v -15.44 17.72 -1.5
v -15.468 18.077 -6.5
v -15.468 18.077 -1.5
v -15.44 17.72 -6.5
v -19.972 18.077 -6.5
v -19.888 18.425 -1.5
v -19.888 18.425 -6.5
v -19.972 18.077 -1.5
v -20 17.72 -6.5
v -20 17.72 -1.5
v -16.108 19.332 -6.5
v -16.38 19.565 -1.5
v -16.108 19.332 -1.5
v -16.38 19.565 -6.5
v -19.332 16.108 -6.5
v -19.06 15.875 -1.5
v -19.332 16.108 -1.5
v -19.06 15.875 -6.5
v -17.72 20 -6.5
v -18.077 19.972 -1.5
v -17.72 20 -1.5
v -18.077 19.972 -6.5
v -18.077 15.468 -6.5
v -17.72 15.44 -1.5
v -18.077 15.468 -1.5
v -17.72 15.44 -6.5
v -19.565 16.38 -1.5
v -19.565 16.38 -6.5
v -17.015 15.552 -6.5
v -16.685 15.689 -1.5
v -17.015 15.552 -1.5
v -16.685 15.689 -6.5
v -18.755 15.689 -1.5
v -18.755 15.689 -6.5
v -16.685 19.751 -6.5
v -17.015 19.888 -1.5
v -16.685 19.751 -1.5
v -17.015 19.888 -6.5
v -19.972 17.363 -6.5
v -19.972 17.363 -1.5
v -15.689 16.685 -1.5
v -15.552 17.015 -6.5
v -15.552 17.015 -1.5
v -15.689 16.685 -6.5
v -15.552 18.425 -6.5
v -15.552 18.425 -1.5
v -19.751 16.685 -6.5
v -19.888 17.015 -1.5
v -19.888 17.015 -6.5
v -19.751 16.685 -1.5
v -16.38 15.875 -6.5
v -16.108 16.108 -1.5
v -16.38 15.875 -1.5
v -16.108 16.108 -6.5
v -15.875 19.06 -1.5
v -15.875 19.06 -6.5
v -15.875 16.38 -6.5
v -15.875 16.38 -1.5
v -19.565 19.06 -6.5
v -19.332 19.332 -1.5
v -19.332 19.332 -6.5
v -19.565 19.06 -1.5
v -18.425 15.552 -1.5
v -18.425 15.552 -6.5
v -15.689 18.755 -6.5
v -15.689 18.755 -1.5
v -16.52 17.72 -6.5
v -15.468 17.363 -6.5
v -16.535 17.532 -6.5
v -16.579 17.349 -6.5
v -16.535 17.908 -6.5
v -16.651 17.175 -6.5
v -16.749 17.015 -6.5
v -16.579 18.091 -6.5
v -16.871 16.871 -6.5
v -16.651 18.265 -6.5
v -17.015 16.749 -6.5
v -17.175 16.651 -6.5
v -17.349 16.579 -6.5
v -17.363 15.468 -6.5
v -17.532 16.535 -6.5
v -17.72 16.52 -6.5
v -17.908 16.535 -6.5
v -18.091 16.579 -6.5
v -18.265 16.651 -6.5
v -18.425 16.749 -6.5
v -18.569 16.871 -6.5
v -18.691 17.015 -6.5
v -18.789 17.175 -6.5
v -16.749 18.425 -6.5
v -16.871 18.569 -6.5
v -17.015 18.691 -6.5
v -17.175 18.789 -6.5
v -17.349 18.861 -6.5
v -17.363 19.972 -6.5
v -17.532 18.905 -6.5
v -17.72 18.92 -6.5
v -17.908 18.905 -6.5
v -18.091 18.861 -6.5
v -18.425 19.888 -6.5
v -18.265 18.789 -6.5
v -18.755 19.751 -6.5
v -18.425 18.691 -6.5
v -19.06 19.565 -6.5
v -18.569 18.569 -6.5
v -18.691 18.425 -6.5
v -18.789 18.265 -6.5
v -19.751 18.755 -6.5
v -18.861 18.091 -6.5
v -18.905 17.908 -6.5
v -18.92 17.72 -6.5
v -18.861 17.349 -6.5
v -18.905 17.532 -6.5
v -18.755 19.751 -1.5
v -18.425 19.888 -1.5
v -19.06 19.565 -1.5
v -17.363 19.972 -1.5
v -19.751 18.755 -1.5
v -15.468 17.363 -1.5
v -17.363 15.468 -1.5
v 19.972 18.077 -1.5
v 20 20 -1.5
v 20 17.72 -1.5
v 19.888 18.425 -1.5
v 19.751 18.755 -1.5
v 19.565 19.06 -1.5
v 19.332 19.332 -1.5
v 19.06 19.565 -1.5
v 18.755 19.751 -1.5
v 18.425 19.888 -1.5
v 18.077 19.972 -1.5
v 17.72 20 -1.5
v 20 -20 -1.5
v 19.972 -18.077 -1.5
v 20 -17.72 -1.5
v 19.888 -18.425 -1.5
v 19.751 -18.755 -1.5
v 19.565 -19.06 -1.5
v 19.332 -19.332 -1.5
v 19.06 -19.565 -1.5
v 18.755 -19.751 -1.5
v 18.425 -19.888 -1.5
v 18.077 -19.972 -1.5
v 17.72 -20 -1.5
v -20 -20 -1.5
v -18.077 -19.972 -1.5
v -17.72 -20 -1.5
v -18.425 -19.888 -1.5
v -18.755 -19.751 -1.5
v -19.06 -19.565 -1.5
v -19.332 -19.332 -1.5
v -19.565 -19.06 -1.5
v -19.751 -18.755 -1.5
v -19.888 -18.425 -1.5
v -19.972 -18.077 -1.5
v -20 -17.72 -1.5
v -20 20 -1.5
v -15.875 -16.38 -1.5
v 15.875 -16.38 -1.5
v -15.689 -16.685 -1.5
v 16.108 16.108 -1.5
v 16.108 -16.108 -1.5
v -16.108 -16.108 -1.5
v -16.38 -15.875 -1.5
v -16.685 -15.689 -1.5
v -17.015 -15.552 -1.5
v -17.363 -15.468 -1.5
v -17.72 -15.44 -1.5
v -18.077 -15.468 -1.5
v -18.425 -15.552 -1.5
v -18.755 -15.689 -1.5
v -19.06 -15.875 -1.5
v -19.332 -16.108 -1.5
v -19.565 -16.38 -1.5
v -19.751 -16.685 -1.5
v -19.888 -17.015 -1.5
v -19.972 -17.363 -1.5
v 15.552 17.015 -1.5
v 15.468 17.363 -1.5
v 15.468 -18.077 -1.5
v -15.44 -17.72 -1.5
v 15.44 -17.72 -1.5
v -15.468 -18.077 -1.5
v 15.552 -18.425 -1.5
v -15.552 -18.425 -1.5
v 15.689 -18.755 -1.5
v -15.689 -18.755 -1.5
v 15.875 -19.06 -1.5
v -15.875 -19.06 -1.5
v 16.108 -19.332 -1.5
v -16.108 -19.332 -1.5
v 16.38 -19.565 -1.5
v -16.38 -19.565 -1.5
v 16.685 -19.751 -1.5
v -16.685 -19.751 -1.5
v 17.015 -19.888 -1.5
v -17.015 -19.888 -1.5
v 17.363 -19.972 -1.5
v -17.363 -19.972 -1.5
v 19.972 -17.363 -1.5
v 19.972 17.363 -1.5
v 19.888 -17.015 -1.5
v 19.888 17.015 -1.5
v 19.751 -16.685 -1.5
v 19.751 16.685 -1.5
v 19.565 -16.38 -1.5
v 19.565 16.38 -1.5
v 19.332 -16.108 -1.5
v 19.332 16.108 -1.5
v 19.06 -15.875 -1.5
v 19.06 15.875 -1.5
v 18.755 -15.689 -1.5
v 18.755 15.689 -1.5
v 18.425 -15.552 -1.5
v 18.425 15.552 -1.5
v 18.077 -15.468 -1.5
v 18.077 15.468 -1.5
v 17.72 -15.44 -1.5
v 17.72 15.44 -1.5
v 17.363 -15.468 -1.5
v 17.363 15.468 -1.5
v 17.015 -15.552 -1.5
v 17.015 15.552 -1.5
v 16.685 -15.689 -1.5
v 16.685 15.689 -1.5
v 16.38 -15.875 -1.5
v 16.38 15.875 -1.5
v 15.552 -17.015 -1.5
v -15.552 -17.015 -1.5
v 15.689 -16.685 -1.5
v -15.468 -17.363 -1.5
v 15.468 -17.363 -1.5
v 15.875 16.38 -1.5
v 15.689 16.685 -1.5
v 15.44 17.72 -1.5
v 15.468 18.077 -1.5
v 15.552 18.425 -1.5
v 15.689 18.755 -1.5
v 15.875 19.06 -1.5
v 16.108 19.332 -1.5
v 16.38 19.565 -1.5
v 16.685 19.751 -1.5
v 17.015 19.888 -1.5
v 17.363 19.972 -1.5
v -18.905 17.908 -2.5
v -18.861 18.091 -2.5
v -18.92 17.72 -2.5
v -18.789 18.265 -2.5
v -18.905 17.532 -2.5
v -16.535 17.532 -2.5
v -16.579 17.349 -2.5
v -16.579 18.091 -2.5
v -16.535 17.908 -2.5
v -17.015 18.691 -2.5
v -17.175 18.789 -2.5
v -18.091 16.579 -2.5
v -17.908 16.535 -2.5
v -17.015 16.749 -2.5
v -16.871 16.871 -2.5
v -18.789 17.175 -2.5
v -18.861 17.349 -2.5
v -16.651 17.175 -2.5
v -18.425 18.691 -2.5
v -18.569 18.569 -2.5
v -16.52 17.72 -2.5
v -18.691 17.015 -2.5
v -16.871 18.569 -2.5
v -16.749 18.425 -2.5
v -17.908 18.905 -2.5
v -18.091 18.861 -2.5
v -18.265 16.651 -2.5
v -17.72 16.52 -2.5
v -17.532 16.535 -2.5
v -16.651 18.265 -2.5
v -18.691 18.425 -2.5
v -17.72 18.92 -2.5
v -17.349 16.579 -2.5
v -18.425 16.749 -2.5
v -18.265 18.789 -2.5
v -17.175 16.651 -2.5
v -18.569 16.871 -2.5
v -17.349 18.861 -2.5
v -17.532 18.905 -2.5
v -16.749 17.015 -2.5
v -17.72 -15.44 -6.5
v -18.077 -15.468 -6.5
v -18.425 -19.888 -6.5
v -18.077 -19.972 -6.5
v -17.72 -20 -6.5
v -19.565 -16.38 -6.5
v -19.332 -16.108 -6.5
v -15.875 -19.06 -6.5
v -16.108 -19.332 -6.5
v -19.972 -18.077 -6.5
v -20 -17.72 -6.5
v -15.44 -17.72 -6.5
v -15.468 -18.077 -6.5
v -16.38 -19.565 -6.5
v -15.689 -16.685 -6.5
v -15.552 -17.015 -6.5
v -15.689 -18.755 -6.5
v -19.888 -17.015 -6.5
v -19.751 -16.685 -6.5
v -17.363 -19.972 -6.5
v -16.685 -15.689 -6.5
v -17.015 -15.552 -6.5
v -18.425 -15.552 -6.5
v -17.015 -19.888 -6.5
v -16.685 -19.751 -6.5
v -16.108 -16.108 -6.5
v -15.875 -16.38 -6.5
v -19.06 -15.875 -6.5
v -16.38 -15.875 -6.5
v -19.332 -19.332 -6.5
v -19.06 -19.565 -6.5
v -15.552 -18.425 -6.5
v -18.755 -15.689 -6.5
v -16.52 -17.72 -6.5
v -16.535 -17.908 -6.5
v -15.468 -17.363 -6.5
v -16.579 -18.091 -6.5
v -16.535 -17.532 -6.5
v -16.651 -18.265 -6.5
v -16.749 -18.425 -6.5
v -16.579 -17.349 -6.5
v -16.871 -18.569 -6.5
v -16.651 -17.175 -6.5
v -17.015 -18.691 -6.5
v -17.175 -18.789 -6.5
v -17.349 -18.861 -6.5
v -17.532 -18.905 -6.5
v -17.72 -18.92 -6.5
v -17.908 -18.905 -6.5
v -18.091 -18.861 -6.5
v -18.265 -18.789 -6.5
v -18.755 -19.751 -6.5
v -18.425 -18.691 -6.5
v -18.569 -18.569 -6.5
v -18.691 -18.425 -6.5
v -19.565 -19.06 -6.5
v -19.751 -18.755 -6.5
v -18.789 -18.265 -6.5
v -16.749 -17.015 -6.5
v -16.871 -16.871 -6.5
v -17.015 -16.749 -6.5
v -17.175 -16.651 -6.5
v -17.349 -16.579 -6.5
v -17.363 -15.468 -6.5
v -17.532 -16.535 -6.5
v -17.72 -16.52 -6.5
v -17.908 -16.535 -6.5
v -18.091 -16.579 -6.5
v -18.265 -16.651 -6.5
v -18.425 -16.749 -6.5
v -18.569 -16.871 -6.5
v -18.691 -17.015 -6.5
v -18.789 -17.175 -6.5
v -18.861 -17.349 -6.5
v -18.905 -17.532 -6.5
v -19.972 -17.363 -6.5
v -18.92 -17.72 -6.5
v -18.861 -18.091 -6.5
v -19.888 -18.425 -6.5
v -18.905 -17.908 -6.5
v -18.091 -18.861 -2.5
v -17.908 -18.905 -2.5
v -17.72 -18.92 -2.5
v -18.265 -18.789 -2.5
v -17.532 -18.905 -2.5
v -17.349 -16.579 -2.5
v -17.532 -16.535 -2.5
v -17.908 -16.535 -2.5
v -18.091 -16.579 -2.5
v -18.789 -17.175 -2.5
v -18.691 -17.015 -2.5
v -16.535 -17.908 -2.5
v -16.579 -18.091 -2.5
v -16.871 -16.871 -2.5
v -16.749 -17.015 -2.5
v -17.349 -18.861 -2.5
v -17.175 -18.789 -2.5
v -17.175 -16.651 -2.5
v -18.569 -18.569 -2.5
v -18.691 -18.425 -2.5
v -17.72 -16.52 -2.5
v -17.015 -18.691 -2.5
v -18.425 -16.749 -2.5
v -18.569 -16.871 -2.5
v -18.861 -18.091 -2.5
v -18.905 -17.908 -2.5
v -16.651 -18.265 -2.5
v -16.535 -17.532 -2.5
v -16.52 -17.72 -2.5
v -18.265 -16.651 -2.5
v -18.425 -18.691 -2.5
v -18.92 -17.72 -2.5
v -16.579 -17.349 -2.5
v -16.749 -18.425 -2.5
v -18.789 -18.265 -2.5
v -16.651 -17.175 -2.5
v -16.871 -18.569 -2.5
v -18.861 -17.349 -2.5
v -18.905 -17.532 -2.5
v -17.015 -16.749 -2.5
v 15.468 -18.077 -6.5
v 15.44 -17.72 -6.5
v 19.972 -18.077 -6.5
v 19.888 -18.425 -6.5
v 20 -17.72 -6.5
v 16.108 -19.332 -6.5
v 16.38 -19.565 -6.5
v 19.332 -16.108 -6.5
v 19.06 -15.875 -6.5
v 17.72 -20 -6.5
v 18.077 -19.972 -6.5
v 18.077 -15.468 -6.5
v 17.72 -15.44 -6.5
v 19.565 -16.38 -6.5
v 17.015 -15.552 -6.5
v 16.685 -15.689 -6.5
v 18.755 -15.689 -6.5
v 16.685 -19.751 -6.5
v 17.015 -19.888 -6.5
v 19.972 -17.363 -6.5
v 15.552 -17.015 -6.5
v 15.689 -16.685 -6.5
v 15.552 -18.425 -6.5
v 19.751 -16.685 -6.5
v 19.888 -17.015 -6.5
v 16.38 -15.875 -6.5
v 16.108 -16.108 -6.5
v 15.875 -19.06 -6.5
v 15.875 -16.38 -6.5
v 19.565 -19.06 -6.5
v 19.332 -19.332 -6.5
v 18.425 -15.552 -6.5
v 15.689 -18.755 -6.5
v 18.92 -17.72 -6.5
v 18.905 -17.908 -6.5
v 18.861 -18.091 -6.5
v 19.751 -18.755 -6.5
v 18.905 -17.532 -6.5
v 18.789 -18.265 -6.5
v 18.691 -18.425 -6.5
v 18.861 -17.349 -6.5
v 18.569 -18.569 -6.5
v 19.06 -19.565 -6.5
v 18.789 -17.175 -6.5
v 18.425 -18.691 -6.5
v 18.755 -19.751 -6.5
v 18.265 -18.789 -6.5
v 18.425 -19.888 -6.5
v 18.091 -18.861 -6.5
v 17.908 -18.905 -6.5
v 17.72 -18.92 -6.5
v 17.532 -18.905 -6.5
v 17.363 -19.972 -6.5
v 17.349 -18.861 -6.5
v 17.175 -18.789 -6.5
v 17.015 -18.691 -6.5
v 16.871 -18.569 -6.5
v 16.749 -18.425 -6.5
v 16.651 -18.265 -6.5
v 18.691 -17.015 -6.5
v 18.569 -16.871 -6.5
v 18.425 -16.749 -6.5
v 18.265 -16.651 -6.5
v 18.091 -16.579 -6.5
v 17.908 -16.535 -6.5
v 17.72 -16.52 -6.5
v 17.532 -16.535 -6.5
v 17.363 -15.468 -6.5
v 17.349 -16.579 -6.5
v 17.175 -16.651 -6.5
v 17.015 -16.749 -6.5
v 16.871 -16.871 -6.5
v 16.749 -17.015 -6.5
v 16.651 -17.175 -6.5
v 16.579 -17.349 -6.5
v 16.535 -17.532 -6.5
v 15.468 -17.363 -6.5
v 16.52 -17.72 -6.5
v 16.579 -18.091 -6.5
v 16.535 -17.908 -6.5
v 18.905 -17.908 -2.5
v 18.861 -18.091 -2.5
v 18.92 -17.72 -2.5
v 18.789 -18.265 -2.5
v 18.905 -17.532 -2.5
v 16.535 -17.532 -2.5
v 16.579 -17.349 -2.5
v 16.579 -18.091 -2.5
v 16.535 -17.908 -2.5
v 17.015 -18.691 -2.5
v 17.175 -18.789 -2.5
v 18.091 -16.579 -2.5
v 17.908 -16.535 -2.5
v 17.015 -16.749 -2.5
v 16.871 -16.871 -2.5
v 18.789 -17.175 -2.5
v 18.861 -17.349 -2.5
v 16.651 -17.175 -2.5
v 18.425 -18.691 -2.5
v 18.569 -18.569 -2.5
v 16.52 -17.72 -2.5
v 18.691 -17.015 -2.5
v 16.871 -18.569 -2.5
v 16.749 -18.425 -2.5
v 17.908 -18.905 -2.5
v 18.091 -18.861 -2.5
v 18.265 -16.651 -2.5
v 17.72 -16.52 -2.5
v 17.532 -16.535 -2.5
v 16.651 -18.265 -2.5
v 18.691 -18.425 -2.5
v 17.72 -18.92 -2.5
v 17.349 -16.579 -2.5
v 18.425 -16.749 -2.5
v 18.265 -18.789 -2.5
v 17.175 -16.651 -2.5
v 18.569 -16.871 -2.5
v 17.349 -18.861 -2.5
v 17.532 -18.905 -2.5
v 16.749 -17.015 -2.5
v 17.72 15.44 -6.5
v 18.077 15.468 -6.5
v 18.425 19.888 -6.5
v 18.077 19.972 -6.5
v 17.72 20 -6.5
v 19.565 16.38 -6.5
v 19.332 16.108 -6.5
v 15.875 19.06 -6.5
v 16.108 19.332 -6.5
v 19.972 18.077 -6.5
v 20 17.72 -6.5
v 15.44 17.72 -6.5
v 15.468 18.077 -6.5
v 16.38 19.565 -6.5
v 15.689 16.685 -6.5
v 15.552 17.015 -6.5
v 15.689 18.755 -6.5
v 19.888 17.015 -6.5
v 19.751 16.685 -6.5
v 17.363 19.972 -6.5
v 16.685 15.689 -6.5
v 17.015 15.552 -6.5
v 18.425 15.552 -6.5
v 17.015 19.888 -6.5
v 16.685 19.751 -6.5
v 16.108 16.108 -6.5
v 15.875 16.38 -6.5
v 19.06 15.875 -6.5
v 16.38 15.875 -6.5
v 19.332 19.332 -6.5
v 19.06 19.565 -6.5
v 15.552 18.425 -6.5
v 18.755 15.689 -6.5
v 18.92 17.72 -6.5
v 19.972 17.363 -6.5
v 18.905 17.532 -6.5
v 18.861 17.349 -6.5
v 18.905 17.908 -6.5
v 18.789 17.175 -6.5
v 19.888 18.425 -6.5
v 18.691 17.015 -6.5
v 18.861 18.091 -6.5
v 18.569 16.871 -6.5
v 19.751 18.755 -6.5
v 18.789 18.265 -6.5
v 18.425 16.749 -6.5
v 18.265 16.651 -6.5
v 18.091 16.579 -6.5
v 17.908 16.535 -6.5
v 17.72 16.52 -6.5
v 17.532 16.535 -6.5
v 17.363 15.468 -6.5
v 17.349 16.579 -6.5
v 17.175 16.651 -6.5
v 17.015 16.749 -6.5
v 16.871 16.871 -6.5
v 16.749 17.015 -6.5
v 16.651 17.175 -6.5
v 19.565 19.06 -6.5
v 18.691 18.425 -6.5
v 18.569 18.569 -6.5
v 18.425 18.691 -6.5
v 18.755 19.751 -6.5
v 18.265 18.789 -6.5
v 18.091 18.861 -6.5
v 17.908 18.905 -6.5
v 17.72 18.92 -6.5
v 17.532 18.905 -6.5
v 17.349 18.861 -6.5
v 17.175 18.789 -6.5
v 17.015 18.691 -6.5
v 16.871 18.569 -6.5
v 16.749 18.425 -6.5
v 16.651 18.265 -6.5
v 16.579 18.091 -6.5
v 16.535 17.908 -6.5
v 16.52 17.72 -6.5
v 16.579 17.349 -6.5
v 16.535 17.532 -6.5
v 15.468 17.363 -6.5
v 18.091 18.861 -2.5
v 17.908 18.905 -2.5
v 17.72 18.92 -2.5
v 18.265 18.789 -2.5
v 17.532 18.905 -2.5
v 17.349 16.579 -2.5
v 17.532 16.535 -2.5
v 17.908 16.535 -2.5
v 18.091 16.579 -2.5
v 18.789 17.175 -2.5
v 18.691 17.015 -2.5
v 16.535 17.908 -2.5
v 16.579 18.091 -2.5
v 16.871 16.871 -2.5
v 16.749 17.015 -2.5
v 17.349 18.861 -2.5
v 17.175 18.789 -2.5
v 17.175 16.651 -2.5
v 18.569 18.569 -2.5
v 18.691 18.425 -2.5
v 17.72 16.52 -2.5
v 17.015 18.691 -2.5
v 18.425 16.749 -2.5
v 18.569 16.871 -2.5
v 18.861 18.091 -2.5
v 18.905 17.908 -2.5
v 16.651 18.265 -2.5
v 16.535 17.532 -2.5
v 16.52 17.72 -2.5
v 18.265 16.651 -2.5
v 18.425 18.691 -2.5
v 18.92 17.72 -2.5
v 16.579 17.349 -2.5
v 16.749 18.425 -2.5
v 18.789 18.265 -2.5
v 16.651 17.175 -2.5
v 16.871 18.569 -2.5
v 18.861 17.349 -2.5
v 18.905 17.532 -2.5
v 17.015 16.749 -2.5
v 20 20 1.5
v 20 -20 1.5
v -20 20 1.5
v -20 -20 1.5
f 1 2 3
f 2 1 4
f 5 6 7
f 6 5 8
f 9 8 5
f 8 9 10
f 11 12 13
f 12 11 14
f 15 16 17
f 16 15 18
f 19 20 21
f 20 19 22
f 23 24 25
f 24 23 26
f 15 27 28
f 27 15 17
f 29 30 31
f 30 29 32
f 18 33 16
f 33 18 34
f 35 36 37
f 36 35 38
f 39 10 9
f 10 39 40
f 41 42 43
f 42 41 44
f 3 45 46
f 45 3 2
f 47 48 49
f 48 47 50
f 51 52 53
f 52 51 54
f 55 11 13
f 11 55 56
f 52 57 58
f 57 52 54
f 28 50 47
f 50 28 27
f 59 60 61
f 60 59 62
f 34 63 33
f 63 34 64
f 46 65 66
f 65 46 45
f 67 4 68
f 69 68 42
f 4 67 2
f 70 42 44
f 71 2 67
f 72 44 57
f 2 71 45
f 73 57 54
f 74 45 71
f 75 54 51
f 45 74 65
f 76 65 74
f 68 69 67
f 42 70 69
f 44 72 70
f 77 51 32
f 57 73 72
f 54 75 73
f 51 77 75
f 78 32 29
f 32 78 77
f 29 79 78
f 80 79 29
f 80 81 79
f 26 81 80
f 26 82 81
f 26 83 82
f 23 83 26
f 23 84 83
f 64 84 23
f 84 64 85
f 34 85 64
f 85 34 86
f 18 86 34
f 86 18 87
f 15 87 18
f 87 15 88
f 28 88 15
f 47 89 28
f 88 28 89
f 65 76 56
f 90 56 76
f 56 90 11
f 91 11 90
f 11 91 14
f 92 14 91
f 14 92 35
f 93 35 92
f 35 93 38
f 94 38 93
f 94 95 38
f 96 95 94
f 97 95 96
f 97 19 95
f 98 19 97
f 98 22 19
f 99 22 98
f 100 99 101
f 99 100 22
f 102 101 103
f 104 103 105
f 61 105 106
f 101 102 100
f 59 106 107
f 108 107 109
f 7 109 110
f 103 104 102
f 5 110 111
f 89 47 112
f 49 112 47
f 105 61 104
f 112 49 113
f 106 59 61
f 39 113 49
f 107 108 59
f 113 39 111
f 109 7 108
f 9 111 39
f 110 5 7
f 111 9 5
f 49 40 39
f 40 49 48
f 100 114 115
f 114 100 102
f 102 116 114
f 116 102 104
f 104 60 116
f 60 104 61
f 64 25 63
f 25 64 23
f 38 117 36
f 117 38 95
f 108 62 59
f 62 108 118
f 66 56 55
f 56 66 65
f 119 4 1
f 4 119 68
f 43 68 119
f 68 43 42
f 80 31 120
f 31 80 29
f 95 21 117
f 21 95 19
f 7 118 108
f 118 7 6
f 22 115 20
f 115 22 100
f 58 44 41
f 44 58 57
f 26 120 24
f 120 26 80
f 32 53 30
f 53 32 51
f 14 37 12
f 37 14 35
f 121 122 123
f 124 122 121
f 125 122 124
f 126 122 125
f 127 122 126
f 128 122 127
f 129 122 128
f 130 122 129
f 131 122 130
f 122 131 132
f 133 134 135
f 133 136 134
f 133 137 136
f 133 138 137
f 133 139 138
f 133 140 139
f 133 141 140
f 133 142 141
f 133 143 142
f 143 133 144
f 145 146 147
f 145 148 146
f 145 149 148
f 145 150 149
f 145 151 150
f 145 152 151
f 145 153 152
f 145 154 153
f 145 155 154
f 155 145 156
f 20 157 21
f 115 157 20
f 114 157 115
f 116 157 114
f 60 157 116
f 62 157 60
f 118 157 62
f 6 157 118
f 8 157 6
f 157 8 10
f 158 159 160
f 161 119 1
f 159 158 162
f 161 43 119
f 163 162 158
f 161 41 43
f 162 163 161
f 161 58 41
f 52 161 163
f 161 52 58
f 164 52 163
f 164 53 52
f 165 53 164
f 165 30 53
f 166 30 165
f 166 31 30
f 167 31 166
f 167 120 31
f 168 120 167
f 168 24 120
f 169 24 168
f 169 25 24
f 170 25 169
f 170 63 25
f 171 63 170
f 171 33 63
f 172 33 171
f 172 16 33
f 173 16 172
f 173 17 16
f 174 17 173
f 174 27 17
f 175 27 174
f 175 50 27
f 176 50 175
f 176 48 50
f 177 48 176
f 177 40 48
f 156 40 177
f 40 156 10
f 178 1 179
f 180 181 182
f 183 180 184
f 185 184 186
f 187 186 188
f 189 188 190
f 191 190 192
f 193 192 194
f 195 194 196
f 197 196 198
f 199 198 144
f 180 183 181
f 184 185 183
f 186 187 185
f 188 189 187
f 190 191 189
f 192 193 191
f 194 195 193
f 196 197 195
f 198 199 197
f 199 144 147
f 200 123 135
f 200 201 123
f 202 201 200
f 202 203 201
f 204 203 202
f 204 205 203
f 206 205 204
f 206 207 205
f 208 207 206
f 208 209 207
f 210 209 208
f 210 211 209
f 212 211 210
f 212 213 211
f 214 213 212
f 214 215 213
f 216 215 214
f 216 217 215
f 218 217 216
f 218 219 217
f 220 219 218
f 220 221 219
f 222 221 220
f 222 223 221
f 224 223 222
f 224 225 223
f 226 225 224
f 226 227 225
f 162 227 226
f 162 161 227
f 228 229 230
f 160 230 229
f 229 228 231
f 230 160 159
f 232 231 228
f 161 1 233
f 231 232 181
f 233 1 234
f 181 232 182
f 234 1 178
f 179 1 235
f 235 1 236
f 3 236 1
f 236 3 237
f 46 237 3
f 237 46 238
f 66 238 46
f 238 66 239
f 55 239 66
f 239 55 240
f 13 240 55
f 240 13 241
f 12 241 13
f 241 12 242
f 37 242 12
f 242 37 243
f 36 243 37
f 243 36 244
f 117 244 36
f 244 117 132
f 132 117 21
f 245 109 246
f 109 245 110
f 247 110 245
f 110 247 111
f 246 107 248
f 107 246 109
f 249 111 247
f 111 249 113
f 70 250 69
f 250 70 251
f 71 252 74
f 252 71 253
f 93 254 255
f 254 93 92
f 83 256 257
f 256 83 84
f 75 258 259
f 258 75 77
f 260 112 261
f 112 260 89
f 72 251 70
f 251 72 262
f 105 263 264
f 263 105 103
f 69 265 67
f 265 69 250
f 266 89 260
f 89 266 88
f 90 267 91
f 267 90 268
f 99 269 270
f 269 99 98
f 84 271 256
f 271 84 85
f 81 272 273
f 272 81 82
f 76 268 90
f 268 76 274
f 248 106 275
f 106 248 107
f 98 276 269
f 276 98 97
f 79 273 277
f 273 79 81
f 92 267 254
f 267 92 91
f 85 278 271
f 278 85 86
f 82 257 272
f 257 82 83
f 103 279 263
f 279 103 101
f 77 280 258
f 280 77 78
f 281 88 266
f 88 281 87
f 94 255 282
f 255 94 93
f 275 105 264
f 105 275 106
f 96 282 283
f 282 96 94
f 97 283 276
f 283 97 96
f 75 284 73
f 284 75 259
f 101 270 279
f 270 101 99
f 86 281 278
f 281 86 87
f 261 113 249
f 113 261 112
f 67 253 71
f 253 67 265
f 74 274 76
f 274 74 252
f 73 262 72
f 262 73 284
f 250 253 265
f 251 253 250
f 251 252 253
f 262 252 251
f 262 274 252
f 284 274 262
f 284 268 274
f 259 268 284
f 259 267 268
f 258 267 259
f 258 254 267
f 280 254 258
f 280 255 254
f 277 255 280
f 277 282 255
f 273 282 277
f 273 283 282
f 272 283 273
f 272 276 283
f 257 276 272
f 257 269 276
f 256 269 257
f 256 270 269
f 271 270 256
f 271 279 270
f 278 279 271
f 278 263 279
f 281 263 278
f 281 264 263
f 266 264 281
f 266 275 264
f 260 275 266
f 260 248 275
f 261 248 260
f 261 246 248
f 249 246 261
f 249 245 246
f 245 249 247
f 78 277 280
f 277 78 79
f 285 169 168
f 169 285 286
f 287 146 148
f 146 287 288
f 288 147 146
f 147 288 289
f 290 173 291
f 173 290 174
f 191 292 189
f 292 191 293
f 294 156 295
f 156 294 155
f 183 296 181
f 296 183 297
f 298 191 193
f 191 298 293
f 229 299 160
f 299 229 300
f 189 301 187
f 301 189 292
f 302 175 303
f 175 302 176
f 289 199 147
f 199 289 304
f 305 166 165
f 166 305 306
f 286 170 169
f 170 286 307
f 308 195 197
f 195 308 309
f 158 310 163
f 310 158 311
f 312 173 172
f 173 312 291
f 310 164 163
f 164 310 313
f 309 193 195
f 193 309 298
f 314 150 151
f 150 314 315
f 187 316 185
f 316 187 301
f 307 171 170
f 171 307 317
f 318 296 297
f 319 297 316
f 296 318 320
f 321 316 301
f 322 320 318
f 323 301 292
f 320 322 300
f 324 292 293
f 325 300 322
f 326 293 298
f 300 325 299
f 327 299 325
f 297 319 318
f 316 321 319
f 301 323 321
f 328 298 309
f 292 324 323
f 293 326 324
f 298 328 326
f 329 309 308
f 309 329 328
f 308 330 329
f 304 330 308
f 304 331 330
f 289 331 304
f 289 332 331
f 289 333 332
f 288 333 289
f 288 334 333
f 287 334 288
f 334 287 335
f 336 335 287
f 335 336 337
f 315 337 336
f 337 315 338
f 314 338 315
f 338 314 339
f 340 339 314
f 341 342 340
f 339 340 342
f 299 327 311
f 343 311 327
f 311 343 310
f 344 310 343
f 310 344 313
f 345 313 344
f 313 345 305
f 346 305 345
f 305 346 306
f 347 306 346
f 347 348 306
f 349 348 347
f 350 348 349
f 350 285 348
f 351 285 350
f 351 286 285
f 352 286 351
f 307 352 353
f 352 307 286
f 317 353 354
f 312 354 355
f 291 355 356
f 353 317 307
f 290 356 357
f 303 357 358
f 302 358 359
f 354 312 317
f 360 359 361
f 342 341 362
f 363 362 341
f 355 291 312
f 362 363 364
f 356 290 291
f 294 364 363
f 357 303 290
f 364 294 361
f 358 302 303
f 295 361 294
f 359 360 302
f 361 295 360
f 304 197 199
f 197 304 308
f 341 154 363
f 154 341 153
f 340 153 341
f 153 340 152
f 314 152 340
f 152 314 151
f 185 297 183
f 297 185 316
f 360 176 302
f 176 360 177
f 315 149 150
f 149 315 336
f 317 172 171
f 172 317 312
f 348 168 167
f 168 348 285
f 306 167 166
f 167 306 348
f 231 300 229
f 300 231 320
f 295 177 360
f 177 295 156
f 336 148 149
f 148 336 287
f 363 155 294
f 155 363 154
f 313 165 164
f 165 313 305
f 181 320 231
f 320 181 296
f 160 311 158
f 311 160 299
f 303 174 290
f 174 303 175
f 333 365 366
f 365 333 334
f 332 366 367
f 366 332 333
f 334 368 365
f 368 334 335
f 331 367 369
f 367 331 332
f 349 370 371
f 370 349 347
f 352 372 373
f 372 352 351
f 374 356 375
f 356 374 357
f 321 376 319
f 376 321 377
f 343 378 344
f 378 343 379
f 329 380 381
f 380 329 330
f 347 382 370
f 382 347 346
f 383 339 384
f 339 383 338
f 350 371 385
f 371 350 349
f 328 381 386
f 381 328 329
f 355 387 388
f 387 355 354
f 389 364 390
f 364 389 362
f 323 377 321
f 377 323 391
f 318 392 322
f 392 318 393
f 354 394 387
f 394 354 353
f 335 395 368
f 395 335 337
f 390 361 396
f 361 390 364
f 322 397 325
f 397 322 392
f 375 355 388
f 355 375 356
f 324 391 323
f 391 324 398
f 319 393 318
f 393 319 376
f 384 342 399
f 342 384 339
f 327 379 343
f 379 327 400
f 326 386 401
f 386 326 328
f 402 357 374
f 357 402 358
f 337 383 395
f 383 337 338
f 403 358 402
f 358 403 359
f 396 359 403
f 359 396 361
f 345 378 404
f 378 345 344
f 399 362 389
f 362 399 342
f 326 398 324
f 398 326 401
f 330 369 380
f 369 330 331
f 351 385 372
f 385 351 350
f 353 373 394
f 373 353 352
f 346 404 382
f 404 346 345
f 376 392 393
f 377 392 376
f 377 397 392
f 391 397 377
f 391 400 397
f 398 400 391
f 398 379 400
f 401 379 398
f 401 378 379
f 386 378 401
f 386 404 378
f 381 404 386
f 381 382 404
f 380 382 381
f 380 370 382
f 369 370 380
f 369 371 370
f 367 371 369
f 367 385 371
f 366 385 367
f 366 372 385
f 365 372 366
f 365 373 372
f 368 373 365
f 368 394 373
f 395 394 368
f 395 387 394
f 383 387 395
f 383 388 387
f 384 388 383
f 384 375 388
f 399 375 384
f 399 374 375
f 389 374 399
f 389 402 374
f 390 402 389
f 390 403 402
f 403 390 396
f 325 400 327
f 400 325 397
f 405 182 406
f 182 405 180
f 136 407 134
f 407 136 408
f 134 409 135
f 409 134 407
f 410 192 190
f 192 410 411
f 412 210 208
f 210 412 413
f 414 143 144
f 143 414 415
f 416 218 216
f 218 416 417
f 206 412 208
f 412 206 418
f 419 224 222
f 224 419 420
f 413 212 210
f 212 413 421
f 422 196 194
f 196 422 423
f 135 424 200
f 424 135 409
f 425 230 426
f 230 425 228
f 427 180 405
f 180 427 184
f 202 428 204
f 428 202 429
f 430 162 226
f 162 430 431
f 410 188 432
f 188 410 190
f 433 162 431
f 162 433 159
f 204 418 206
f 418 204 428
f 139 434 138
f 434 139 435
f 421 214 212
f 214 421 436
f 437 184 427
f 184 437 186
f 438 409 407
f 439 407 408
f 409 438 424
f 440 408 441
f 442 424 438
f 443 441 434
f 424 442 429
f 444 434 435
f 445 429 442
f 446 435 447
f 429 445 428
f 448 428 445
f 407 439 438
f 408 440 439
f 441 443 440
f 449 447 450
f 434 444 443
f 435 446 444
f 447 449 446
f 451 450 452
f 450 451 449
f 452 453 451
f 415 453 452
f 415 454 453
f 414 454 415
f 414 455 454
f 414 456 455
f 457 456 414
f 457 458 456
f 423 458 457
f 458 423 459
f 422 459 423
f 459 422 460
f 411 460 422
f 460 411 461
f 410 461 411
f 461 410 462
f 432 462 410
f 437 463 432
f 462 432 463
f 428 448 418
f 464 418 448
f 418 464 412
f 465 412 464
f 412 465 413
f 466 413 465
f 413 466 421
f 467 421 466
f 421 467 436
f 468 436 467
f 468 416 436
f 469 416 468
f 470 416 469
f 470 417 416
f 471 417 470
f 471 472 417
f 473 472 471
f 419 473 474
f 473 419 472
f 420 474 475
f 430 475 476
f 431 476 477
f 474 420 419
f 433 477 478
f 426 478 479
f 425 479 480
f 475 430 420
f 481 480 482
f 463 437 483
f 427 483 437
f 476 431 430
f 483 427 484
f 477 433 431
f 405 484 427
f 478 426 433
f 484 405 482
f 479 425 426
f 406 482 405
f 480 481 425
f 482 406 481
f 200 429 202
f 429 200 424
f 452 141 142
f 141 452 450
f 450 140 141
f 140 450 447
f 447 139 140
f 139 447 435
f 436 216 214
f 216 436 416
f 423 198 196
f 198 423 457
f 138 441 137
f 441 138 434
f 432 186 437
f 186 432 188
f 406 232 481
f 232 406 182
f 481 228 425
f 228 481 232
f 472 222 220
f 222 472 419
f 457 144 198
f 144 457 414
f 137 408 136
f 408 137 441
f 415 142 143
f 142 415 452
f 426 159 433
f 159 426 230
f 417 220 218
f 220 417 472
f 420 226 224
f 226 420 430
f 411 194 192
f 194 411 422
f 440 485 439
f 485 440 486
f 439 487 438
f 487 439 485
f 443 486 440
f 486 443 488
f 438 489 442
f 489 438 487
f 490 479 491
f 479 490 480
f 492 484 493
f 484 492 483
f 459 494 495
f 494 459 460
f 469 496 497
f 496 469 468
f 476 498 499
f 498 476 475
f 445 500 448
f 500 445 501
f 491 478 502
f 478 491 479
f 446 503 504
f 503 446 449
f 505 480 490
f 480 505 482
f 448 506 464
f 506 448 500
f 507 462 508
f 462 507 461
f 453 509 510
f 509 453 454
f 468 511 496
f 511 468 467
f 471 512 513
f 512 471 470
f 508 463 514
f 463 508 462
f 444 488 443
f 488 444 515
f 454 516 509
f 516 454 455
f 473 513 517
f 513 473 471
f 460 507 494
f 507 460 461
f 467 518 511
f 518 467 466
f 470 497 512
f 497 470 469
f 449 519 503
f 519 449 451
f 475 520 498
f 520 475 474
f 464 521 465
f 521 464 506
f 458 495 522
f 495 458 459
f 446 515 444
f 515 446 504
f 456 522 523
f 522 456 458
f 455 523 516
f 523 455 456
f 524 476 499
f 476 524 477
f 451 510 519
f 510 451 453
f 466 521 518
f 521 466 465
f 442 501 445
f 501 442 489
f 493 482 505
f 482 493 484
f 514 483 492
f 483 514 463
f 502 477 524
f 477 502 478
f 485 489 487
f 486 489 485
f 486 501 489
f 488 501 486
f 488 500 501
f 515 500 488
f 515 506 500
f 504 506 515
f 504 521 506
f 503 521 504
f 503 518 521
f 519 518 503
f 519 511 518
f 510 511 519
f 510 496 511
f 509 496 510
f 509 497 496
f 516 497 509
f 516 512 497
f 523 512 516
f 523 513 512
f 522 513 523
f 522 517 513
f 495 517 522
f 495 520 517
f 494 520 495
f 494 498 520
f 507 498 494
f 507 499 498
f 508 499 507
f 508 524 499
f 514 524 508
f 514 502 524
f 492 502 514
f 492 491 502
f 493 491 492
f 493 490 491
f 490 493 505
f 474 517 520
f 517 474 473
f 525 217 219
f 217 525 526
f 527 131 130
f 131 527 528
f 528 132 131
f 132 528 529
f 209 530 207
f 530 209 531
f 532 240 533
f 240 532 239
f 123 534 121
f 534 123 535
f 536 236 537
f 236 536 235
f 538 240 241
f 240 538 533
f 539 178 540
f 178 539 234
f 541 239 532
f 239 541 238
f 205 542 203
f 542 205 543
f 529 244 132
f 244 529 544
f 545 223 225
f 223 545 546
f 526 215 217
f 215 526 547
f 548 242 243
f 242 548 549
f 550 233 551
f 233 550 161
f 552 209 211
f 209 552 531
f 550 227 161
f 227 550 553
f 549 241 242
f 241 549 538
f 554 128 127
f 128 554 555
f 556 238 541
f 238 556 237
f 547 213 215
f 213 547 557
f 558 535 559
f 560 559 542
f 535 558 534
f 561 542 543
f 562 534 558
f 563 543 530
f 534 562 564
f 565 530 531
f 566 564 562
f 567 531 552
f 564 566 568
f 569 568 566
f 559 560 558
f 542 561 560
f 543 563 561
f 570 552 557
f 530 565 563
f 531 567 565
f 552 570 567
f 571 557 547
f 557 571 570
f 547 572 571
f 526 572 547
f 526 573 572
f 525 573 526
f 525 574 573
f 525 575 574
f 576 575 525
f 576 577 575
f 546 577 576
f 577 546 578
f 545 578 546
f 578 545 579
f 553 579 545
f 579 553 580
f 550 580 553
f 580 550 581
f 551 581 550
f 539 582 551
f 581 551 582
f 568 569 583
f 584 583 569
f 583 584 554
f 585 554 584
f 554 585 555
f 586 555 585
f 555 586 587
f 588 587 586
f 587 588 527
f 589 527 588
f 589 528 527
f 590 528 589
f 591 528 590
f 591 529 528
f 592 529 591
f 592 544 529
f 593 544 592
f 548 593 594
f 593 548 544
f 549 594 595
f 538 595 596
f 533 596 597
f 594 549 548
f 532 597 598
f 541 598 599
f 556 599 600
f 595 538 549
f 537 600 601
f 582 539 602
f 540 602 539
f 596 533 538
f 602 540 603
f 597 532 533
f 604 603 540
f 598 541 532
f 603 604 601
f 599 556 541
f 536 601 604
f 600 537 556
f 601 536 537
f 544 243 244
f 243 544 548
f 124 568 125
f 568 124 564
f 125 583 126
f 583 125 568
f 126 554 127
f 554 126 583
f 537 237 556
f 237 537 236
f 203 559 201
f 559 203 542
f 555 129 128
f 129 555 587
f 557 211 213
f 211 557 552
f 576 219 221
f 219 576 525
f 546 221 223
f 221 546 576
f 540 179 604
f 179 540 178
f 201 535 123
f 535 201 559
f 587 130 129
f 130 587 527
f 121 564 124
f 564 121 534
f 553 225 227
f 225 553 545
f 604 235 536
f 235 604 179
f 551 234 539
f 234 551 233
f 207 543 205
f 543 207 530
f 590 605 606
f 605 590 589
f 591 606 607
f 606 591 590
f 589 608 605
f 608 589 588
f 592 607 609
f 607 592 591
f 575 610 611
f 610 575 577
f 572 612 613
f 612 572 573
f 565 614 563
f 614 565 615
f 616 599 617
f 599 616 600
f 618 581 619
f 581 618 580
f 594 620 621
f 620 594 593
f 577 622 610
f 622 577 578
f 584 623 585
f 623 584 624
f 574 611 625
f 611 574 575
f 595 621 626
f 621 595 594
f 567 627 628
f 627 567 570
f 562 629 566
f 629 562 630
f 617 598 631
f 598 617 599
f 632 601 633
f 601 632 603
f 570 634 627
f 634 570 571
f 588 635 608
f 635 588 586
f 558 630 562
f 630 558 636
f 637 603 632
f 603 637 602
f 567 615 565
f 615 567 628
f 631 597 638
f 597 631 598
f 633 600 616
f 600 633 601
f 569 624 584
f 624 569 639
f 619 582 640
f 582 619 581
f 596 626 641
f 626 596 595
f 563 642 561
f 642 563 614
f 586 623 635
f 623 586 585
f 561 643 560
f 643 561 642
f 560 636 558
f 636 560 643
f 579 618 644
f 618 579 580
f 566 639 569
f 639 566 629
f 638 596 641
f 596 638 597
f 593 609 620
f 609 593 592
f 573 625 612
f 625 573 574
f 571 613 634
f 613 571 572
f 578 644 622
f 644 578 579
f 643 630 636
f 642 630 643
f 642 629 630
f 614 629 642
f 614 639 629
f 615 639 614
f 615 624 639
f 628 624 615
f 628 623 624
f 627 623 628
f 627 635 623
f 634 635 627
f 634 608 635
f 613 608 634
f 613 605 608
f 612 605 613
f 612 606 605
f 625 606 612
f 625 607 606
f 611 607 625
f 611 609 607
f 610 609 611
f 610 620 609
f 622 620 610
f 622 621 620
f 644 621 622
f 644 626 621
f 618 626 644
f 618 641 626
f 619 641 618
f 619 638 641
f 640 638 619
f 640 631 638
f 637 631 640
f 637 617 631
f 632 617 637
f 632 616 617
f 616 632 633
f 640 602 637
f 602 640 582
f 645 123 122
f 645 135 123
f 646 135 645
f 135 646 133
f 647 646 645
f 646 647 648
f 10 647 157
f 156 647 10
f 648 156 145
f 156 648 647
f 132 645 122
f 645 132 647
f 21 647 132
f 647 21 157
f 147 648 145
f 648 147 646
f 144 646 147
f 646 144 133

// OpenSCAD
$fn = 40;

module frame_top() {
  width = 40.0;
  thickness = 3.0;

  tolerance = 1.2;
  screw_size = 2.0;
  screw_safe_size = screw_size * tolerance;

  standoff_size = screw_safe_size * 1.9;
  standoff_height = 5.0;

  cube([width, width, thickness], center=true);

  tx = (width / 2) - standoff_size / 2;
  ty = (width / 2) - standoff_size / 2;
  tz = thickness / 2;
  for (i = [0.0:90.0:360.0]){
    rotate([0.0, 180.0, i])
      difference() {
        translate([tx, ty, tz])
          #cylinder(r = standoff_size / 2, h = standoff_height);

        translate([tx, ty, tz + 1])
          cylinder(r = screw_safe_size / 2, h = standoff_height);
      }
  }
}

frame_top();
